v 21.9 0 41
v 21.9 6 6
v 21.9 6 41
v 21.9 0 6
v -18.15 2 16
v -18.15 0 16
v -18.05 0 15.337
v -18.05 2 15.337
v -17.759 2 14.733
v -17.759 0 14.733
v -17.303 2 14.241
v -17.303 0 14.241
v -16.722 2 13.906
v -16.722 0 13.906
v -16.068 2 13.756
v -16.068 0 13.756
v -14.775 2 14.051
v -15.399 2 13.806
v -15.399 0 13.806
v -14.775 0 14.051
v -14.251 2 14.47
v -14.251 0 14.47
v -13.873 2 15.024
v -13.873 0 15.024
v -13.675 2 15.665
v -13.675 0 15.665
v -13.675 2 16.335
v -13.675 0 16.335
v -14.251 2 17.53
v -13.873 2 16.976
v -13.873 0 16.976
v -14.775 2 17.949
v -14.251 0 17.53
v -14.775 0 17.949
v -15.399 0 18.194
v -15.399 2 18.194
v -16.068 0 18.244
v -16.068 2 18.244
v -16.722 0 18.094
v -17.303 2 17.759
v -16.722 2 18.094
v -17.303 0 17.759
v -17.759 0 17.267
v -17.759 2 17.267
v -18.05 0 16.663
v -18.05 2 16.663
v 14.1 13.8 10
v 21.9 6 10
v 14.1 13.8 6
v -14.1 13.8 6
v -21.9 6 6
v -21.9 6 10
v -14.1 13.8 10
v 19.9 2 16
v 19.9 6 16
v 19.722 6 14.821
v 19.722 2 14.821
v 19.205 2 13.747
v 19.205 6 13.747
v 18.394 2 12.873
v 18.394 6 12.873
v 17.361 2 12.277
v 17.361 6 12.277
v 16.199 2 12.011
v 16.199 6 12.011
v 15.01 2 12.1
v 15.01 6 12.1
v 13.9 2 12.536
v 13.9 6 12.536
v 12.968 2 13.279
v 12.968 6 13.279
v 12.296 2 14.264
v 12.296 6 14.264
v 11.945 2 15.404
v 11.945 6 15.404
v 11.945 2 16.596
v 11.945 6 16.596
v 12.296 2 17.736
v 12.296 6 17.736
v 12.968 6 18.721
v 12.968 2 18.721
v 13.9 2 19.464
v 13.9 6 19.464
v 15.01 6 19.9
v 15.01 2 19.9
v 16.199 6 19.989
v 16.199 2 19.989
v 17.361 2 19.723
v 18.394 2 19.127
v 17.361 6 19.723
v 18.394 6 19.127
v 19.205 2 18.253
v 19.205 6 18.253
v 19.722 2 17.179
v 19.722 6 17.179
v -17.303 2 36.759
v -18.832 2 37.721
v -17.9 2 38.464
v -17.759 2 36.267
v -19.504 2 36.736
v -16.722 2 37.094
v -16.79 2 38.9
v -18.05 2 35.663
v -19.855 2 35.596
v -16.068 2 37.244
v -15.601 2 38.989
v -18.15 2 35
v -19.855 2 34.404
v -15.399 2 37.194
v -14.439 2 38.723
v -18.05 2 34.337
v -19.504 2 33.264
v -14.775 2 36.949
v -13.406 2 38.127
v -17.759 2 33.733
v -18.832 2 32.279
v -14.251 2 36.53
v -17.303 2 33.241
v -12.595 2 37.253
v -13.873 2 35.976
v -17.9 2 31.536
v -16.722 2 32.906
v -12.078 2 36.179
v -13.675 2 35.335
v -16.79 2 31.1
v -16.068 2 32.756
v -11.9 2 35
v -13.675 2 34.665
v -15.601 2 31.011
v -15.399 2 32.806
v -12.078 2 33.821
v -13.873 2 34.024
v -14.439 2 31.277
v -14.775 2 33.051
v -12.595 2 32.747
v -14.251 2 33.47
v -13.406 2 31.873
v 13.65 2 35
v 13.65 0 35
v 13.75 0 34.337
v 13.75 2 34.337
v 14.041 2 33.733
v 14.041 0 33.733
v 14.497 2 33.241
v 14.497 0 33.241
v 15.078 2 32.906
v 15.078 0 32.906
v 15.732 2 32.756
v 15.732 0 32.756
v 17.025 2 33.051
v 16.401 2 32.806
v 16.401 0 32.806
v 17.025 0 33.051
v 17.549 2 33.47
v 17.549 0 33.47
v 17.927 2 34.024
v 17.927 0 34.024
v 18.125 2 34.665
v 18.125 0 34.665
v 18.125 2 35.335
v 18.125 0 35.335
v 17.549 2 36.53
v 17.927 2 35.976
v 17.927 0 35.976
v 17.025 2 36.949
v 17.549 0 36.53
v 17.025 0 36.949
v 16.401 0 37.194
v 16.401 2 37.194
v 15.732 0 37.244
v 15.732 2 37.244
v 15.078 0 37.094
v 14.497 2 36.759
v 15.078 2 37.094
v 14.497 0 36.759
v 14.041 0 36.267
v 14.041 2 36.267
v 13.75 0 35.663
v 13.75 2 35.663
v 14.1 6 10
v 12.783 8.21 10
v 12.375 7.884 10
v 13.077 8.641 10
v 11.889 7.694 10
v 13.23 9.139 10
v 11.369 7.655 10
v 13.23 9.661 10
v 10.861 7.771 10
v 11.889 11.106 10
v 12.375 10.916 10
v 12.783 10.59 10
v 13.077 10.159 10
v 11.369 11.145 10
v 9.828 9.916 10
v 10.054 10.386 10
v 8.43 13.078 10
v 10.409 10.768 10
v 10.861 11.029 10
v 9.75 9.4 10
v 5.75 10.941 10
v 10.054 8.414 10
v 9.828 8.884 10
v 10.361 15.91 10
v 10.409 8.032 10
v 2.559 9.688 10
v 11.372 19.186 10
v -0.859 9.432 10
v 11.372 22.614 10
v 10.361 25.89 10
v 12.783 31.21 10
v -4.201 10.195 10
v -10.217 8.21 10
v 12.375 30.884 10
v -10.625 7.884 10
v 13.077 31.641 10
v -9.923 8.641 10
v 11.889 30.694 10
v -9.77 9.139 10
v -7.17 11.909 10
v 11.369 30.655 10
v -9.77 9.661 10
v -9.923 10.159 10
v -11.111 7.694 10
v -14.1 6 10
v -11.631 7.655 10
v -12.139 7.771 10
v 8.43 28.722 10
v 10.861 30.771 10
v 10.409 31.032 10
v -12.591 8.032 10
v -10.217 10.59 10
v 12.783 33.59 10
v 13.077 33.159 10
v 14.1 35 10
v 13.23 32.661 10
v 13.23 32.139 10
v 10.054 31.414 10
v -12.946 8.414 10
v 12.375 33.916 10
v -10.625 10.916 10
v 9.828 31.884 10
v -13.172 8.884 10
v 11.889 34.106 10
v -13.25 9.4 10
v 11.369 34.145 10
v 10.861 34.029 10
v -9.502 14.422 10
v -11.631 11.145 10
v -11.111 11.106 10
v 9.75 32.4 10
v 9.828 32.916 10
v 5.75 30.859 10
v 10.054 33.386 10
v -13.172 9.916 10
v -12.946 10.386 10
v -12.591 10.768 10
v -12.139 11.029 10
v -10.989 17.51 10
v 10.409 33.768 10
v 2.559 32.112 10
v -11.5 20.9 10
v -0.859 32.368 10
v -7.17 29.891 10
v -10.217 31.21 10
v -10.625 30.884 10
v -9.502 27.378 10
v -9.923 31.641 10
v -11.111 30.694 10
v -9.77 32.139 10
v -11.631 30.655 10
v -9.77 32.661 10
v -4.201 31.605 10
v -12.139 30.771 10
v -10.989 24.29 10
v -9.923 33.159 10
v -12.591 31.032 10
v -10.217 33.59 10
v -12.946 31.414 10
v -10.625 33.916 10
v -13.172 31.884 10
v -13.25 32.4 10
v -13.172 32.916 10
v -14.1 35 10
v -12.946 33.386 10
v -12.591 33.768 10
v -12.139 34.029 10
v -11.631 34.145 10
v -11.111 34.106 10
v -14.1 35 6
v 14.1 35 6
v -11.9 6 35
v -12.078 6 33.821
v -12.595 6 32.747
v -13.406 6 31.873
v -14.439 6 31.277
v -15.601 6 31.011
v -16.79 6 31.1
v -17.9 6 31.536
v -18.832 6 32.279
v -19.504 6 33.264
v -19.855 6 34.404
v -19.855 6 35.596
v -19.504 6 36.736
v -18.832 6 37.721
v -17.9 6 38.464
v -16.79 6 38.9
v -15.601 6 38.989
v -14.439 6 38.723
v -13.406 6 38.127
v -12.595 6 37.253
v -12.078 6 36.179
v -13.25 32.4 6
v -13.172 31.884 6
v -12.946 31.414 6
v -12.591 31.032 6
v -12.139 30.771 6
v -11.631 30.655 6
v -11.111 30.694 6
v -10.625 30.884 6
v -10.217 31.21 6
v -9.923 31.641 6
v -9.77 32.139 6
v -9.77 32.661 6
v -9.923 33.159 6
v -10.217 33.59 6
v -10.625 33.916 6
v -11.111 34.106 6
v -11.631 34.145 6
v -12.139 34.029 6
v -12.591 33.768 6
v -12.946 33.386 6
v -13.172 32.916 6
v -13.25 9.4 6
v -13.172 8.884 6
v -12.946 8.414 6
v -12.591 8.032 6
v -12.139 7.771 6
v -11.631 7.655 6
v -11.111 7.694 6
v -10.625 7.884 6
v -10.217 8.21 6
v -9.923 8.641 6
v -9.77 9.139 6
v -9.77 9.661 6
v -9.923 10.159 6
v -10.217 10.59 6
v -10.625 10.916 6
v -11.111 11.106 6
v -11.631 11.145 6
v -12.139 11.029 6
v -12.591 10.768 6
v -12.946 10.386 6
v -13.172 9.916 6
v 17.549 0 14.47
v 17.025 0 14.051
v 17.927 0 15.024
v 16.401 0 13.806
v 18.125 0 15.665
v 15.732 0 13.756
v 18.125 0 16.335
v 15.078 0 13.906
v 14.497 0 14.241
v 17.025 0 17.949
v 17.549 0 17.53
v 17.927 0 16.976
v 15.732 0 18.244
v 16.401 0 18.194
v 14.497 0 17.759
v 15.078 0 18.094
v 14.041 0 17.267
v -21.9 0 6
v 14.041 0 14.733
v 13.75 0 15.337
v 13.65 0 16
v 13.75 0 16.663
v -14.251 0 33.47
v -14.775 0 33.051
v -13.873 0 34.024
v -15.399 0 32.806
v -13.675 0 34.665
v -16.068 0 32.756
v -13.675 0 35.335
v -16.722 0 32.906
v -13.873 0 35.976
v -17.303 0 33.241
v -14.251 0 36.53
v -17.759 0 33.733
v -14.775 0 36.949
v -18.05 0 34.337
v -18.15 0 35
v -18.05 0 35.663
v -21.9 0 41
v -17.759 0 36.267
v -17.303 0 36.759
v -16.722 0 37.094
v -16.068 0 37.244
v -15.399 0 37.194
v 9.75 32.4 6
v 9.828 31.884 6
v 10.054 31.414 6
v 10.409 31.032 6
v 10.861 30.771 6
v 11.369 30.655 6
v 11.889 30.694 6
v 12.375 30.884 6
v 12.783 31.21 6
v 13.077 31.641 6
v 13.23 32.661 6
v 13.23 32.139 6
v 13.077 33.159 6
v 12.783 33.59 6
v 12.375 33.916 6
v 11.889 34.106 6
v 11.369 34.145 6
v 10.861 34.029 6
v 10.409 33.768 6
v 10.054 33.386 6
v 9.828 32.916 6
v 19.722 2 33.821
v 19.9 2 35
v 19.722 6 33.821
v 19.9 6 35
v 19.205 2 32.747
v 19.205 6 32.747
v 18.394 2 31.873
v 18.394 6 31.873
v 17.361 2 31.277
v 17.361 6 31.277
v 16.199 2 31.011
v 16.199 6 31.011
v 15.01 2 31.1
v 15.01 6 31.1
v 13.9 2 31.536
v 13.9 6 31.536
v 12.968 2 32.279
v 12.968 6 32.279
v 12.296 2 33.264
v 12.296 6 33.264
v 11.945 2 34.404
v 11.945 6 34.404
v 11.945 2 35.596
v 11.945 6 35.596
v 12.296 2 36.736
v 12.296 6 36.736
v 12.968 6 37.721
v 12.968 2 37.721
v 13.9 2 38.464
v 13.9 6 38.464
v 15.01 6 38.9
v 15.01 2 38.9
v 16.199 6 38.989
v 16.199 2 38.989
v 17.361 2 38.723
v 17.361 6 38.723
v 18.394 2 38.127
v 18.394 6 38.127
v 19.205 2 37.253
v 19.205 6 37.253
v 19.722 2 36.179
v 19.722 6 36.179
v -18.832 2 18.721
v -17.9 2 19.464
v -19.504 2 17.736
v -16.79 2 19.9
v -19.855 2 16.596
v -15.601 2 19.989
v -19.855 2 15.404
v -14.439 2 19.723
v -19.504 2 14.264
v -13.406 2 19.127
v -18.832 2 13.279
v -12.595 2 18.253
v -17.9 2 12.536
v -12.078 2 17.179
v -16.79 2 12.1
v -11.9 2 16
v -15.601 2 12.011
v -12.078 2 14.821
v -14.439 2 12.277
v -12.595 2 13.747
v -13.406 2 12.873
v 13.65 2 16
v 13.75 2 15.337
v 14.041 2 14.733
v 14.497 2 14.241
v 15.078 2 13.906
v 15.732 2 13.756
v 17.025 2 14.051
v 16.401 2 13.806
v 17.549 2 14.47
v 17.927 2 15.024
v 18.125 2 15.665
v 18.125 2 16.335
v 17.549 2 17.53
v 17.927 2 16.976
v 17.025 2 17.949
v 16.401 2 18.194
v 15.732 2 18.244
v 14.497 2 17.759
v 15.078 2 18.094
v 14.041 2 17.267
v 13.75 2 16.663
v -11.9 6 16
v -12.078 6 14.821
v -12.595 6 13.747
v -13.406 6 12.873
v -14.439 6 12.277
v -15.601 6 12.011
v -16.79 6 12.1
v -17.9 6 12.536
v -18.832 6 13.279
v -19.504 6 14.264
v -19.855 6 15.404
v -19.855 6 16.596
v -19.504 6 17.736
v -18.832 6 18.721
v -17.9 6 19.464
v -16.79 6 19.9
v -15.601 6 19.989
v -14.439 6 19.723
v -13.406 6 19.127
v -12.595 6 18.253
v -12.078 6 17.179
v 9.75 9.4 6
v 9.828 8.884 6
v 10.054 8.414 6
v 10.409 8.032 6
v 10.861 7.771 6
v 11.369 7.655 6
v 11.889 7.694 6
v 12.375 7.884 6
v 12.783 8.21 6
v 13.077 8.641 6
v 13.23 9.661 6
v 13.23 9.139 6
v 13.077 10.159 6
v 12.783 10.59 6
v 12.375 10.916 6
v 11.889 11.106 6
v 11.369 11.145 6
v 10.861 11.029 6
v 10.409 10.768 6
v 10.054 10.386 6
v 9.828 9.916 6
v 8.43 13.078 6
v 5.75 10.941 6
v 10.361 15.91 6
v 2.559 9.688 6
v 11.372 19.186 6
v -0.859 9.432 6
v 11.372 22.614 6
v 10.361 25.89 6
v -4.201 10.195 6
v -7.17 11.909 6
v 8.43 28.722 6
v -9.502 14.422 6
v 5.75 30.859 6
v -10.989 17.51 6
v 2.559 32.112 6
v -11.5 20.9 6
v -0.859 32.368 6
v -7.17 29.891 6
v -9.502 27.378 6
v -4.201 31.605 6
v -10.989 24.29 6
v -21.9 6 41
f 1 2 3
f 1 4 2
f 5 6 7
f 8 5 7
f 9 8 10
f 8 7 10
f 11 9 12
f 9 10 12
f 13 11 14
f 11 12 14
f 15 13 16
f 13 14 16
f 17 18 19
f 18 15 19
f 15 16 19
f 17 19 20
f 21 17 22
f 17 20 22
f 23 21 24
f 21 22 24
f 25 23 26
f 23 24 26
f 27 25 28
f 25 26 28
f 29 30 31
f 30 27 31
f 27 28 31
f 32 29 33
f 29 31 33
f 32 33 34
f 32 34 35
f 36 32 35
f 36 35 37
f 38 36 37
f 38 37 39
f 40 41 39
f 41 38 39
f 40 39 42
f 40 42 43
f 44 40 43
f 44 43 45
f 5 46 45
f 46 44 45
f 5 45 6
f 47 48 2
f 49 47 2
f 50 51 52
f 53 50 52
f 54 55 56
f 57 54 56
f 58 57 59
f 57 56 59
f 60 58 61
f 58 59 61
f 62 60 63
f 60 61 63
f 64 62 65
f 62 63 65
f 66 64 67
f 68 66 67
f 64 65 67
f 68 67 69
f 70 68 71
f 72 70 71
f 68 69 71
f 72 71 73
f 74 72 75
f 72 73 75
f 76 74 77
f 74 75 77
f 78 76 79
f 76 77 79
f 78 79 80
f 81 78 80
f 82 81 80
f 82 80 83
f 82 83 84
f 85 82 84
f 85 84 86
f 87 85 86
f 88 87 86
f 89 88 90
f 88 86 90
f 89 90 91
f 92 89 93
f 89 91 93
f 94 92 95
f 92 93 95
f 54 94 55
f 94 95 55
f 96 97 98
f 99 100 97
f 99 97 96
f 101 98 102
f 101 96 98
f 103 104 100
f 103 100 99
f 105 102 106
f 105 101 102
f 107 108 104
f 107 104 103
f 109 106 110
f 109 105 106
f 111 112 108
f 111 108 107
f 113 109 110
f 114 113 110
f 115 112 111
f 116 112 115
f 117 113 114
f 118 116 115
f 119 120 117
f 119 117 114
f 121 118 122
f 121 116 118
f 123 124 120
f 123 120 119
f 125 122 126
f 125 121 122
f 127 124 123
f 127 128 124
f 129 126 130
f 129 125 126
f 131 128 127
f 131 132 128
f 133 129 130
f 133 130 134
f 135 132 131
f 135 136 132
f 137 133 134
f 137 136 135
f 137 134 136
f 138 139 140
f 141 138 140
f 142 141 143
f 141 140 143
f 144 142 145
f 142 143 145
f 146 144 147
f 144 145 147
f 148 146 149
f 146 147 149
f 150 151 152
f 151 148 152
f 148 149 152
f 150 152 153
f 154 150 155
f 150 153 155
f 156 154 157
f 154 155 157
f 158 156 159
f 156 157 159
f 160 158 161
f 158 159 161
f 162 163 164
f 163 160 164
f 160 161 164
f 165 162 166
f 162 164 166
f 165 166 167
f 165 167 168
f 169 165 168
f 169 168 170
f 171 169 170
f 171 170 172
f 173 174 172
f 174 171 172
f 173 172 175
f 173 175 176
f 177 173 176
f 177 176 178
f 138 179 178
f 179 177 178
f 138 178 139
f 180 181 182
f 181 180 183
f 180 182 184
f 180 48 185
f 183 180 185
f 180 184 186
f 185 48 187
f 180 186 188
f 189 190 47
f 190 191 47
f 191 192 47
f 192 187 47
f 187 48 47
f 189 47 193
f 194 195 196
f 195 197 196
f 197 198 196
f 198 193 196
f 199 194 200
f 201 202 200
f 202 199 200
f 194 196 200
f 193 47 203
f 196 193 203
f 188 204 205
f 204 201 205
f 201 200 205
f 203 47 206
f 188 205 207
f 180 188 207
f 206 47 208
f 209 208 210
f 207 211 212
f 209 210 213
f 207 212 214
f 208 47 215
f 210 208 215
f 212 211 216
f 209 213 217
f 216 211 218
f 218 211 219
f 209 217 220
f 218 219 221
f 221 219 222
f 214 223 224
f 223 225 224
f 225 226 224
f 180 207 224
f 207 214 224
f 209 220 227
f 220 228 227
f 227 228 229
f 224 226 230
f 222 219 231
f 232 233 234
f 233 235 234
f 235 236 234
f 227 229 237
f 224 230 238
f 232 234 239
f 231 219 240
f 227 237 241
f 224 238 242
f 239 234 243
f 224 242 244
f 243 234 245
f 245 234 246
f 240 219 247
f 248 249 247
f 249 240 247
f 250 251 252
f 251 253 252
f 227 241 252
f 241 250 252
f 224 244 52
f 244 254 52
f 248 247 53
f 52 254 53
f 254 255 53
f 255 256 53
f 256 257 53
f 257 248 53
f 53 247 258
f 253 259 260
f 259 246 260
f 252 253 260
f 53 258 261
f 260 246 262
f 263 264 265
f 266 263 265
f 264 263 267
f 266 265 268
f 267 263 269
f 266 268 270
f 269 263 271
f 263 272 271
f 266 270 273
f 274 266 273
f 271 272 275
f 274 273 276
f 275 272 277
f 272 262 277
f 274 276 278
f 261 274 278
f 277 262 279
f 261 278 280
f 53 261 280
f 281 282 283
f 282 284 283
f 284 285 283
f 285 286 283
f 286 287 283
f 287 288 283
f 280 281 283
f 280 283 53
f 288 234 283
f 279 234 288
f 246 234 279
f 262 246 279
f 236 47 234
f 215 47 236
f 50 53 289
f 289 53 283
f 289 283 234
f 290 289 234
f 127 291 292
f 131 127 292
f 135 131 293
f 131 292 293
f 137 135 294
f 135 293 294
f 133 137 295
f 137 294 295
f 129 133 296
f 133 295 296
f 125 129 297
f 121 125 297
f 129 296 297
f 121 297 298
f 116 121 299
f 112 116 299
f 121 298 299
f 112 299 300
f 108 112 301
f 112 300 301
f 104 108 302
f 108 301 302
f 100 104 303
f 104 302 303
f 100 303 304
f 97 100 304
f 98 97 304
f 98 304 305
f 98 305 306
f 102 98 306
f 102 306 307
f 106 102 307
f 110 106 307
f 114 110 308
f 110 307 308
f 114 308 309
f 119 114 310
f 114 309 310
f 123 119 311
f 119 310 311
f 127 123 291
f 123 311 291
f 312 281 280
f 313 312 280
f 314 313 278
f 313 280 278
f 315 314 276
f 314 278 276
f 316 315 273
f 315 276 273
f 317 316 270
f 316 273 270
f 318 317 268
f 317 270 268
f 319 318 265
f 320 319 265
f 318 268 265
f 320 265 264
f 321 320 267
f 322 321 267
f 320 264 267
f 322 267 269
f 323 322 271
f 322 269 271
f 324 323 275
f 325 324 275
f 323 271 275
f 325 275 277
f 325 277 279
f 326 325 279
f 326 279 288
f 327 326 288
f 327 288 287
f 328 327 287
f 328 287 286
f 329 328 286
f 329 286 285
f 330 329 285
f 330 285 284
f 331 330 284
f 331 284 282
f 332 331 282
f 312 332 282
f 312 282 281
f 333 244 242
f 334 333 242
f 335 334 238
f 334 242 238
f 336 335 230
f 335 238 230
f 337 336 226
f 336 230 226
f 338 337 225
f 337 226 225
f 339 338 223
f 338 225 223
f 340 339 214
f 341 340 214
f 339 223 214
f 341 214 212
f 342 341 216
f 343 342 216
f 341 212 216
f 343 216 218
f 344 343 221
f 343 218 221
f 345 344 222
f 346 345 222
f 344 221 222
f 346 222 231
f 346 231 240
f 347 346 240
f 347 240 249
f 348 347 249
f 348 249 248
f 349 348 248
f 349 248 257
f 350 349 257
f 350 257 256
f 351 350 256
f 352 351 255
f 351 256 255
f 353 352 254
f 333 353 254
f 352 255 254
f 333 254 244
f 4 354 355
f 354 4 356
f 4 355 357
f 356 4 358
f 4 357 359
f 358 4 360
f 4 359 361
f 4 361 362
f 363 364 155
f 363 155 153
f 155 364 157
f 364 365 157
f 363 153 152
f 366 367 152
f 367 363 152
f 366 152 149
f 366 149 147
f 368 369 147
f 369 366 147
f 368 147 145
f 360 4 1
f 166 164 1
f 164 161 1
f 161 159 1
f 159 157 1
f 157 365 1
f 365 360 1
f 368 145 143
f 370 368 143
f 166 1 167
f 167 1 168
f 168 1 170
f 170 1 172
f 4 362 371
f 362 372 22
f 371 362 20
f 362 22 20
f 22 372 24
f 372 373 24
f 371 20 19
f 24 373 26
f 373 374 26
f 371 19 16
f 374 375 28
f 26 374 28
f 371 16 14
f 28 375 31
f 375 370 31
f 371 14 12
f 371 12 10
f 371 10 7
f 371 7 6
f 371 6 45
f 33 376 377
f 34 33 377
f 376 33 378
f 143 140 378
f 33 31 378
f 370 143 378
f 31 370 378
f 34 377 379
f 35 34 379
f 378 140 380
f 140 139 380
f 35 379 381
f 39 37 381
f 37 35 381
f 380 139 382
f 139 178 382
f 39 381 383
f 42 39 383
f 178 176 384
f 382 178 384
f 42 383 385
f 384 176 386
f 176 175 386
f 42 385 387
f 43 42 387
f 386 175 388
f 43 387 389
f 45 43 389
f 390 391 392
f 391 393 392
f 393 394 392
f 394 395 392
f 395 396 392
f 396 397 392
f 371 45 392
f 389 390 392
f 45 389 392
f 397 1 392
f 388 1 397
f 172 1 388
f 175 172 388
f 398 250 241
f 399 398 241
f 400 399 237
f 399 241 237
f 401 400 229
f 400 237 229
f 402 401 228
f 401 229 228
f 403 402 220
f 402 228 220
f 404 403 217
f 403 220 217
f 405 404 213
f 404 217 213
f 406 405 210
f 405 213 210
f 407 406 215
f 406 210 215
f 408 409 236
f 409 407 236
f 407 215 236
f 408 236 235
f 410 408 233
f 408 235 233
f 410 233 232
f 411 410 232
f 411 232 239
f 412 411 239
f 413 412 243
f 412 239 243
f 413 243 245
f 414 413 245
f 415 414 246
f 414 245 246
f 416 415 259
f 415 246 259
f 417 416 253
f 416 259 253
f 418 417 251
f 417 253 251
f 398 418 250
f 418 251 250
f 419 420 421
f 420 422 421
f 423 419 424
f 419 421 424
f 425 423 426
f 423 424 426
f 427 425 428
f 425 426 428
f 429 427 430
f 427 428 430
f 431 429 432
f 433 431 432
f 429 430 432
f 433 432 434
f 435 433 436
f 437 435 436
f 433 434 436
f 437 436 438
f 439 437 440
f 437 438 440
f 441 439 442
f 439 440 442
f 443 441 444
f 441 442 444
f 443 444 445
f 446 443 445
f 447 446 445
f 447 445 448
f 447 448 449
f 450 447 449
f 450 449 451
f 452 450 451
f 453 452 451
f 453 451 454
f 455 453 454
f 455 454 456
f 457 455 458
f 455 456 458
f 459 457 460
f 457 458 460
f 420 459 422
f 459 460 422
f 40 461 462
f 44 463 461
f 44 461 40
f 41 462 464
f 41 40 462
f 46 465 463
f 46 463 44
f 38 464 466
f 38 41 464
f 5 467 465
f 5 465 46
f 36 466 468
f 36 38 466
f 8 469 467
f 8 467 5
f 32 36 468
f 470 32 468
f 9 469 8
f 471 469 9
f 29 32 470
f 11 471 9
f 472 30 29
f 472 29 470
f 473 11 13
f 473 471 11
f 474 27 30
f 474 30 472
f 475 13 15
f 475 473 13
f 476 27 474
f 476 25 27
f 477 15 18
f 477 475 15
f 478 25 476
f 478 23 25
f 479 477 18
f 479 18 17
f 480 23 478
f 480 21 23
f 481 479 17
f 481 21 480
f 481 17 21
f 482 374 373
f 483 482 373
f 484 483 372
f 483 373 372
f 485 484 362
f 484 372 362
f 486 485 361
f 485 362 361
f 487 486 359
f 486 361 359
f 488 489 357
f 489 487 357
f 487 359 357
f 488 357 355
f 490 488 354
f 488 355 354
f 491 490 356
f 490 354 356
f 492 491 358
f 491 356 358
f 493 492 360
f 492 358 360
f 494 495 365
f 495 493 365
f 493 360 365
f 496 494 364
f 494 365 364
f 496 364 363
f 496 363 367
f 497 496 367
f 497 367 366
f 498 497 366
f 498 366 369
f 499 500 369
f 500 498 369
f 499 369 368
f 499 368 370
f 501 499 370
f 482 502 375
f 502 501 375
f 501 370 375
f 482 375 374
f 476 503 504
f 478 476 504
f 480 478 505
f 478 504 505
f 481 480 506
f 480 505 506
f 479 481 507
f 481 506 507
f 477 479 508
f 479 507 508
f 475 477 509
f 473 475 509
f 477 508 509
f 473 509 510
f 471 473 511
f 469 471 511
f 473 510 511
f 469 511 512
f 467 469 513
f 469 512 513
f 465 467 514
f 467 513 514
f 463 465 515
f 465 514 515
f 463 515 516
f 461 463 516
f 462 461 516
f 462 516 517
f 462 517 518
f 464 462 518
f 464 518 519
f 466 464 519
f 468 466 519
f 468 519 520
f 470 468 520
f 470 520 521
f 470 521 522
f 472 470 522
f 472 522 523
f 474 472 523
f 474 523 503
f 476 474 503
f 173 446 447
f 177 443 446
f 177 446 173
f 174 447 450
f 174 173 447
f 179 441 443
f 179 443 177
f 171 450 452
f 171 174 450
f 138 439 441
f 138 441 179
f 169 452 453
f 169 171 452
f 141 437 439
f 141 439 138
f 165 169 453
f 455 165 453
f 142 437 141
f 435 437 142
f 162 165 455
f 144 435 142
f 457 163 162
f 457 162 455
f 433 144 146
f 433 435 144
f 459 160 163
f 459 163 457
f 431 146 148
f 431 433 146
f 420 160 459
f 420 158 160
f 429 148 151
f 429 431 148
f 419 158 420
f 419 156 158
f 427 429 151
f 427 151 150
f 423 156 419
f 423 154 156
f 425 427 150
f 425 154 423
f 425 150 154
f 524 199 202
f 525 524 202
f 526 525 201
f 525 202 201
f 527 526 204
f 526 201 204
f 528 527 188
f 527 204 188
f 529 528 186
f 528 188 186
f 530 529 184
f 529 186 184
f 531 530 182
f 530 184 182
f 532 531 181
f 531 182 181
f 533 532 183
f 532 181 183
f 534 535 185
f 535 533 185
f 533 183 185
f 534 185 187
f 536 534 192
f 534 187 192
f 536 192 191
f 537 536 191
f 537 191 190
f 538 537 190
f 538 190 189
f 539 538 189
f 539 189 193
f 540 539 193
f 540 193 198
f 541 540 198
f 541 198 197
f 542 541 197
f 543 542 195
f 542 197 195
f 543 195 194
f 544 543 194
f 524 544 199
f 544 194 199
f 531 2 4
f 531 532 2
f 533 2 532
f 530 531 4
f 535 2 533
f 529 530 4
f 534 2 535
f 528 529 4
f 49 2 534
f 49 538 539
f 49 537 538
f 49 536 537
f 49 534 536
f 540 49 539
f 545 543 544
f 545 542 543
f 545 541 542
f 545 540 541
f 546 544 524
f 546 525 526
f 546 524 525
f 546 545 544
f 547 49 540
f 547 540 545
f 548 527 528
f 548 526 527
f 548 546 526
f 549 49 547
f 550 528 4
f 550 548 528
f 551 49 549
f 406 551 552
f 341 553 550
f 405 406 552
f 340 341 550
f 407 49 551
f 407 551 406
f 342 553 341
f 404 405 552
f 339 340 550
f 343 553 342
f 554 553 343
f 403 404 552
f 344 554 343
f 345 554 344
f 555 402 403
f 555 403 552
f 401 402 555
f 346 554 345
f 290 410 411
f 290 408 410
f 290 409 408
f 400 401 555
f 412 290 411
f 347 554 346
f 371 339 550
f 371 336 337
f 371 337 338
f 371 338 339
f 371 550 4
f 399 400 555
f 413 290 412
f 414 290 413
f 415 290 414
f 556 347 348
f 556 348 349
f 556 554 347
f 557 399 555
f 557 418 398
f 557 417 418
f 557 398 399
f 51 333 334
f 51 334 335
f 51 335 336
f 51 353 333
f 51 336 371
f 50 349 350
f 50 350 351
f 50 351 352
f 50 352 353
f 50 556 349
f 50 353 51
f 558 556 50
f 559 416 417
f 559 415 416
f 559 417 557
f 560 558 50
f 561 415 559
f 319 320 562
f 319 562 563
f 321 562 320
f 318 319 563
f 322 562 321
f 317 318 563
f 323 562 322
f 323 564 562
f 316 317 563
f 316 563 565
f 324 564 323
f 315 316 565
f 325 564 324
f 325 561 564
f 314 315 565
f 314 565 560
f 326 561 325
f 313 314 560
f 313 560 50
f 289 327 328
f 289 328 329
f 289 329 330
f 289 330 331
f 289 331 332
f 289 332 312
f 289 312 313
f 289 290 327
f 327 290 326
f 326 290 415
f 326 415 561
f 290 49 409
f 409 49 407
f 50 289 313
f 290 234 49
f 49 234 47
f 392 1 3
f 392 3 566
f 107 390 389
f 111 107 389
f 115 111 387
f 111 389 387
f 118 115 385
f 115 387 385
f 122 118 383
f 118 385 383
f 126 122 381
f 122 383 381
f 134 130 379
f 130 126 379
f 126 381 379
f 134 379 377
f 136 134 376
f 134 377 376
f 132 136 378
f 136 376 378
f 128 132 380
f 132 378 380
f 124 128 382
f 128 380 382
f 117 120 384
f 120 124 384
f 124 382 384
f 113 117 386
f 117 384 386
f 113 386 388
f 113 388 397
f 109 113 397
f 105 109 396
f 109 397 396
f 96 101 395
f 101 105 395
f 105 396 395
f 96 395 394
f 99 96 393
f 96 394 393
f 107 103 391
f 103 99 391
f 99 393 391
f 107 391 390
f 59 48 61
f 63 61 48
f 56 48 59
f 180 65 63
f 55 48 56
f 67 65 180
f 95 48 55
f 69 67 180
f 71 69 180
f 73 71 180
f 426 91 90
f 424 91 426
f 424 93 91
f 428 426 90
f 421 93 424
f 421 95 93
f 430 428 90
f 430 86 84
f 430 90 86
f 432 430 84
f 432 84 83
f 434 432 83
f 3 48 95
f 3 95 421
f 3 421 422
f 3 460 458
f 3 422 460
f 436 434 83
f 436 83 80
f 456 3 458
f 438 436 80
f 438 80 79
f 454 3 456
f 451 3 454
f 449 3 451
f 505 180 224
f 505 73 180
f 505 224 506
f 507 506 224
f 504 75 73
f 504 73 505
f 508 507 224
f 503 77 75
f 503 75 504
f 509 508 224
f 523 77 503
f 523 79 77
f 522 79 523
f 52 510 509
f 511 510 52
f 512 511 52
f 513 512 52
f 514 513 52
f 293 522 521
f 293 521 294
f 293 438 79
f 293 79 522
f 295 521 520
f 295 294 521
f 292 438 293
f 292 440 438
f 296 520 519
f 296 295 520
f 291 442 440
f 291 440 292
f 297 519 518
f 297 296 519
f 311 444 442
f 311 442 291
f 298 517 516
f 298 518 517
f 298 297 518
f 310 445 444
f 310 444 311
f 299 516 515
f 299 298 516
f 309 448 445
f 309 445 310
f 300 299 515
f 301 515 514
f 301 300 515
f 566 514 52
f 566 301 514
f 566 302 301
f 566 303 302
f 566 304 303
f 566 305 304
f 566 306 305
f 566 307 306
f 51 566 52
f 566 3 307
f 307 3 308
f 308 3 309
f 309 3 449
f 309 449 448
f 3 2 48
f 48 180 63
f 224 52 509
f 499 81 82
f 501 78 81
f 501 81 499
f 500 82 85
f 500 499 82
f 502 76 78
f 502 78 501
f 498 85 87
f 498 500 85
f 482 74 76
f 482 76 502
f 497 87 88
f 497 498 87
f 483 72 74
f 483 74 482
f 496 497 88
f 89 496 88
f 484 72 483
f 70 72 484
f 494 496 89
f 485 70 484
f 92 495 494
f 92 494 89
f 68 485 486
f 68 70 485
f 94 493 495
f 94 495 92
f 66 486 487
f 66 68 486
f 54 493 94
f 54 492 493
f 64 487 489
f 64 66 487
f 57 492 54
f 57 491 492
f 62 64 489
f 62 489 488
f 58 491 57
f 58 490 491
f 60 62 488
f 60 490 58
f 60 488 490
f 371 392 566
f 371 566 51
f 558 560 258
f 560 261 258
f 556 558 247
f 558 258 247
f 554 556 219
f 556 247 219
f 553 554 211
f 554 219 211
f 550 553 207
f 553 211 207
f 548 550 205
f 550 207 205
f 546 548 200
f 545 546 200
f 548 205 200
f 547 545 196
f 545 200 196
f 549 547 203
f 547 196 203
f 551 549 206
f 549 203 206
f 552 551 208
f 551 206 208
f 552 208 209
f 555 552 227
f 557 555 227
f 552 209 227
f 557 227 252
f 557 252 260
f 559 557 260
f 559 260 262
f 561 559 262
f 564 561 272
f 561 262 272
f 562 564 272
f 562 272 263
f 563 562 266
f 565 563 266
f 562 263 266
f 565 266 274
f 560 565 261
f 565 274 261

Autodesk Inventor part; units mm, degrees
ref_plane "YZ Plane" through (0, 0, 0) normal (1, 0, 0) x (0, 1, 0)
ref_plane "XZ Plane" through (0, 0, 0) normal (0, 1, 0) x (-1, 0, 0)
ref_plane "XY Plane" through (0, 0, 0) normal (0, 0, 1) x (1, 0, 0)
sketch "Sketch1" plane through (0, 0, 0) normal (0, 1, 0) x (-1, 0, 0)
  circle A0 centre (15.9, 35) radius 2.25
  circle A1 centre (15.9, 16) radius 2.25
  circle A2 centre (-15.9, 16) radius 2.25
  circle A3 centre (-15.9, 35) radius 2.25
  line L0 (21.9, 10) -> (-21.9, 10)
  line L1 (-21.9, 10) -> (-21.9, 41)
  line L2 (-21.9, 41) -> (21.9, 41)
  line L3 (21.9, 41) -> (21.9, 10)
  point P0 (0, 0)
  point P1 (0, 0)
  dimension "d0" = 43.8
  dimension "d1" = 31
extrude "Extrusion1" add sketch "Sketch1" along normal blind 6
sketch "Sketch2" plane through (0, 6, 0) normal (0, 1, 0) x (1, 0, 0)
  circle A0 centre (-15.9, -16) radius 2.25 projected
  circle A1 centre (-15.9, -16) radius 4
  circle A2 centre (-15.9, -35) radius 2.25 projected
  circle A3 centre (-15.9, -35) radius 4
  circle A4 centre (15.9, -35) radius 2.25 projected
  circle A5 centre (15.9, -35) radius 4
  circle A6 centre (15.9, -16) radius 2.25 projected
  circle A7 centre (15.9, -16) radius 4
  point P0 (0, 0)
  dimension "d4" = 8
  dimension "d5" = 8
  dimension "d6" = 8
  dimension "d7" = 8
extrude "Extrusion2" cut sketch "Sketch2" against normal blind 4
sketch "Sketch4" plane through (21.9, 0, 10) normal (0, 0, -1) x (-1, 0, 0)
  line L0 (43.8, 0) -> (0, 0) projected
  line L1 (43.8, 0) -> (43.8, 6) projected
  line L2 (0, 6) -> (43.8, 6) projected
  line L3 (0, 0) -> (0, 6) projected
  line L4 (0, 6) -> (43.8, 6) projected
  line L5 (36, 6) -> (36, 35)
  line L6 (36, 35) -> (21.9, 35)
  line L7 (36, 35) -> (7.8, 35)
  line L8 (7.8, 35) -> (7.8, 6)
  line L9 (36, 6.8) -> (36, 35)
  line L10 (33.4, 32.4) -> (21.9, 32.4)
  line L11 (10.4, 9.4) -> (33.4, 9.4)
  circle A0 centre (33.4, 32.4) radius 1.75
  circle A1 centre (10.4, 32.4) radius 1.75
  circle A2 centre (10.4, 9.4) radius 1.75
  circle A3 centre (33.4, 9.4) radius 1.75
  circle A4 centre (21.9, 20.9) radius 11.5
  point P0 (21.9, 0)
  dimension "d31" = 14.1
  dimension "d34" = 11.5
  dimension "d39" = 3.5
  dimension "d40" = 3.5
  dimension "d41" = 3.5
  dimension "d42" = 3.5
  dimension "d43" = 23
extrude "Extrusion4" add sketch "Sketch4" along normal blind 4
chamfer "Chamfer3" distance 7.8 angle 45 1 edges at (14.1, 6, 8)
chamfer "Chamfer4" distance 7.8 angle 45 1 edges at (-14.1, 6, 8)
properties part number "NEMA14 Mounting Bracket"
